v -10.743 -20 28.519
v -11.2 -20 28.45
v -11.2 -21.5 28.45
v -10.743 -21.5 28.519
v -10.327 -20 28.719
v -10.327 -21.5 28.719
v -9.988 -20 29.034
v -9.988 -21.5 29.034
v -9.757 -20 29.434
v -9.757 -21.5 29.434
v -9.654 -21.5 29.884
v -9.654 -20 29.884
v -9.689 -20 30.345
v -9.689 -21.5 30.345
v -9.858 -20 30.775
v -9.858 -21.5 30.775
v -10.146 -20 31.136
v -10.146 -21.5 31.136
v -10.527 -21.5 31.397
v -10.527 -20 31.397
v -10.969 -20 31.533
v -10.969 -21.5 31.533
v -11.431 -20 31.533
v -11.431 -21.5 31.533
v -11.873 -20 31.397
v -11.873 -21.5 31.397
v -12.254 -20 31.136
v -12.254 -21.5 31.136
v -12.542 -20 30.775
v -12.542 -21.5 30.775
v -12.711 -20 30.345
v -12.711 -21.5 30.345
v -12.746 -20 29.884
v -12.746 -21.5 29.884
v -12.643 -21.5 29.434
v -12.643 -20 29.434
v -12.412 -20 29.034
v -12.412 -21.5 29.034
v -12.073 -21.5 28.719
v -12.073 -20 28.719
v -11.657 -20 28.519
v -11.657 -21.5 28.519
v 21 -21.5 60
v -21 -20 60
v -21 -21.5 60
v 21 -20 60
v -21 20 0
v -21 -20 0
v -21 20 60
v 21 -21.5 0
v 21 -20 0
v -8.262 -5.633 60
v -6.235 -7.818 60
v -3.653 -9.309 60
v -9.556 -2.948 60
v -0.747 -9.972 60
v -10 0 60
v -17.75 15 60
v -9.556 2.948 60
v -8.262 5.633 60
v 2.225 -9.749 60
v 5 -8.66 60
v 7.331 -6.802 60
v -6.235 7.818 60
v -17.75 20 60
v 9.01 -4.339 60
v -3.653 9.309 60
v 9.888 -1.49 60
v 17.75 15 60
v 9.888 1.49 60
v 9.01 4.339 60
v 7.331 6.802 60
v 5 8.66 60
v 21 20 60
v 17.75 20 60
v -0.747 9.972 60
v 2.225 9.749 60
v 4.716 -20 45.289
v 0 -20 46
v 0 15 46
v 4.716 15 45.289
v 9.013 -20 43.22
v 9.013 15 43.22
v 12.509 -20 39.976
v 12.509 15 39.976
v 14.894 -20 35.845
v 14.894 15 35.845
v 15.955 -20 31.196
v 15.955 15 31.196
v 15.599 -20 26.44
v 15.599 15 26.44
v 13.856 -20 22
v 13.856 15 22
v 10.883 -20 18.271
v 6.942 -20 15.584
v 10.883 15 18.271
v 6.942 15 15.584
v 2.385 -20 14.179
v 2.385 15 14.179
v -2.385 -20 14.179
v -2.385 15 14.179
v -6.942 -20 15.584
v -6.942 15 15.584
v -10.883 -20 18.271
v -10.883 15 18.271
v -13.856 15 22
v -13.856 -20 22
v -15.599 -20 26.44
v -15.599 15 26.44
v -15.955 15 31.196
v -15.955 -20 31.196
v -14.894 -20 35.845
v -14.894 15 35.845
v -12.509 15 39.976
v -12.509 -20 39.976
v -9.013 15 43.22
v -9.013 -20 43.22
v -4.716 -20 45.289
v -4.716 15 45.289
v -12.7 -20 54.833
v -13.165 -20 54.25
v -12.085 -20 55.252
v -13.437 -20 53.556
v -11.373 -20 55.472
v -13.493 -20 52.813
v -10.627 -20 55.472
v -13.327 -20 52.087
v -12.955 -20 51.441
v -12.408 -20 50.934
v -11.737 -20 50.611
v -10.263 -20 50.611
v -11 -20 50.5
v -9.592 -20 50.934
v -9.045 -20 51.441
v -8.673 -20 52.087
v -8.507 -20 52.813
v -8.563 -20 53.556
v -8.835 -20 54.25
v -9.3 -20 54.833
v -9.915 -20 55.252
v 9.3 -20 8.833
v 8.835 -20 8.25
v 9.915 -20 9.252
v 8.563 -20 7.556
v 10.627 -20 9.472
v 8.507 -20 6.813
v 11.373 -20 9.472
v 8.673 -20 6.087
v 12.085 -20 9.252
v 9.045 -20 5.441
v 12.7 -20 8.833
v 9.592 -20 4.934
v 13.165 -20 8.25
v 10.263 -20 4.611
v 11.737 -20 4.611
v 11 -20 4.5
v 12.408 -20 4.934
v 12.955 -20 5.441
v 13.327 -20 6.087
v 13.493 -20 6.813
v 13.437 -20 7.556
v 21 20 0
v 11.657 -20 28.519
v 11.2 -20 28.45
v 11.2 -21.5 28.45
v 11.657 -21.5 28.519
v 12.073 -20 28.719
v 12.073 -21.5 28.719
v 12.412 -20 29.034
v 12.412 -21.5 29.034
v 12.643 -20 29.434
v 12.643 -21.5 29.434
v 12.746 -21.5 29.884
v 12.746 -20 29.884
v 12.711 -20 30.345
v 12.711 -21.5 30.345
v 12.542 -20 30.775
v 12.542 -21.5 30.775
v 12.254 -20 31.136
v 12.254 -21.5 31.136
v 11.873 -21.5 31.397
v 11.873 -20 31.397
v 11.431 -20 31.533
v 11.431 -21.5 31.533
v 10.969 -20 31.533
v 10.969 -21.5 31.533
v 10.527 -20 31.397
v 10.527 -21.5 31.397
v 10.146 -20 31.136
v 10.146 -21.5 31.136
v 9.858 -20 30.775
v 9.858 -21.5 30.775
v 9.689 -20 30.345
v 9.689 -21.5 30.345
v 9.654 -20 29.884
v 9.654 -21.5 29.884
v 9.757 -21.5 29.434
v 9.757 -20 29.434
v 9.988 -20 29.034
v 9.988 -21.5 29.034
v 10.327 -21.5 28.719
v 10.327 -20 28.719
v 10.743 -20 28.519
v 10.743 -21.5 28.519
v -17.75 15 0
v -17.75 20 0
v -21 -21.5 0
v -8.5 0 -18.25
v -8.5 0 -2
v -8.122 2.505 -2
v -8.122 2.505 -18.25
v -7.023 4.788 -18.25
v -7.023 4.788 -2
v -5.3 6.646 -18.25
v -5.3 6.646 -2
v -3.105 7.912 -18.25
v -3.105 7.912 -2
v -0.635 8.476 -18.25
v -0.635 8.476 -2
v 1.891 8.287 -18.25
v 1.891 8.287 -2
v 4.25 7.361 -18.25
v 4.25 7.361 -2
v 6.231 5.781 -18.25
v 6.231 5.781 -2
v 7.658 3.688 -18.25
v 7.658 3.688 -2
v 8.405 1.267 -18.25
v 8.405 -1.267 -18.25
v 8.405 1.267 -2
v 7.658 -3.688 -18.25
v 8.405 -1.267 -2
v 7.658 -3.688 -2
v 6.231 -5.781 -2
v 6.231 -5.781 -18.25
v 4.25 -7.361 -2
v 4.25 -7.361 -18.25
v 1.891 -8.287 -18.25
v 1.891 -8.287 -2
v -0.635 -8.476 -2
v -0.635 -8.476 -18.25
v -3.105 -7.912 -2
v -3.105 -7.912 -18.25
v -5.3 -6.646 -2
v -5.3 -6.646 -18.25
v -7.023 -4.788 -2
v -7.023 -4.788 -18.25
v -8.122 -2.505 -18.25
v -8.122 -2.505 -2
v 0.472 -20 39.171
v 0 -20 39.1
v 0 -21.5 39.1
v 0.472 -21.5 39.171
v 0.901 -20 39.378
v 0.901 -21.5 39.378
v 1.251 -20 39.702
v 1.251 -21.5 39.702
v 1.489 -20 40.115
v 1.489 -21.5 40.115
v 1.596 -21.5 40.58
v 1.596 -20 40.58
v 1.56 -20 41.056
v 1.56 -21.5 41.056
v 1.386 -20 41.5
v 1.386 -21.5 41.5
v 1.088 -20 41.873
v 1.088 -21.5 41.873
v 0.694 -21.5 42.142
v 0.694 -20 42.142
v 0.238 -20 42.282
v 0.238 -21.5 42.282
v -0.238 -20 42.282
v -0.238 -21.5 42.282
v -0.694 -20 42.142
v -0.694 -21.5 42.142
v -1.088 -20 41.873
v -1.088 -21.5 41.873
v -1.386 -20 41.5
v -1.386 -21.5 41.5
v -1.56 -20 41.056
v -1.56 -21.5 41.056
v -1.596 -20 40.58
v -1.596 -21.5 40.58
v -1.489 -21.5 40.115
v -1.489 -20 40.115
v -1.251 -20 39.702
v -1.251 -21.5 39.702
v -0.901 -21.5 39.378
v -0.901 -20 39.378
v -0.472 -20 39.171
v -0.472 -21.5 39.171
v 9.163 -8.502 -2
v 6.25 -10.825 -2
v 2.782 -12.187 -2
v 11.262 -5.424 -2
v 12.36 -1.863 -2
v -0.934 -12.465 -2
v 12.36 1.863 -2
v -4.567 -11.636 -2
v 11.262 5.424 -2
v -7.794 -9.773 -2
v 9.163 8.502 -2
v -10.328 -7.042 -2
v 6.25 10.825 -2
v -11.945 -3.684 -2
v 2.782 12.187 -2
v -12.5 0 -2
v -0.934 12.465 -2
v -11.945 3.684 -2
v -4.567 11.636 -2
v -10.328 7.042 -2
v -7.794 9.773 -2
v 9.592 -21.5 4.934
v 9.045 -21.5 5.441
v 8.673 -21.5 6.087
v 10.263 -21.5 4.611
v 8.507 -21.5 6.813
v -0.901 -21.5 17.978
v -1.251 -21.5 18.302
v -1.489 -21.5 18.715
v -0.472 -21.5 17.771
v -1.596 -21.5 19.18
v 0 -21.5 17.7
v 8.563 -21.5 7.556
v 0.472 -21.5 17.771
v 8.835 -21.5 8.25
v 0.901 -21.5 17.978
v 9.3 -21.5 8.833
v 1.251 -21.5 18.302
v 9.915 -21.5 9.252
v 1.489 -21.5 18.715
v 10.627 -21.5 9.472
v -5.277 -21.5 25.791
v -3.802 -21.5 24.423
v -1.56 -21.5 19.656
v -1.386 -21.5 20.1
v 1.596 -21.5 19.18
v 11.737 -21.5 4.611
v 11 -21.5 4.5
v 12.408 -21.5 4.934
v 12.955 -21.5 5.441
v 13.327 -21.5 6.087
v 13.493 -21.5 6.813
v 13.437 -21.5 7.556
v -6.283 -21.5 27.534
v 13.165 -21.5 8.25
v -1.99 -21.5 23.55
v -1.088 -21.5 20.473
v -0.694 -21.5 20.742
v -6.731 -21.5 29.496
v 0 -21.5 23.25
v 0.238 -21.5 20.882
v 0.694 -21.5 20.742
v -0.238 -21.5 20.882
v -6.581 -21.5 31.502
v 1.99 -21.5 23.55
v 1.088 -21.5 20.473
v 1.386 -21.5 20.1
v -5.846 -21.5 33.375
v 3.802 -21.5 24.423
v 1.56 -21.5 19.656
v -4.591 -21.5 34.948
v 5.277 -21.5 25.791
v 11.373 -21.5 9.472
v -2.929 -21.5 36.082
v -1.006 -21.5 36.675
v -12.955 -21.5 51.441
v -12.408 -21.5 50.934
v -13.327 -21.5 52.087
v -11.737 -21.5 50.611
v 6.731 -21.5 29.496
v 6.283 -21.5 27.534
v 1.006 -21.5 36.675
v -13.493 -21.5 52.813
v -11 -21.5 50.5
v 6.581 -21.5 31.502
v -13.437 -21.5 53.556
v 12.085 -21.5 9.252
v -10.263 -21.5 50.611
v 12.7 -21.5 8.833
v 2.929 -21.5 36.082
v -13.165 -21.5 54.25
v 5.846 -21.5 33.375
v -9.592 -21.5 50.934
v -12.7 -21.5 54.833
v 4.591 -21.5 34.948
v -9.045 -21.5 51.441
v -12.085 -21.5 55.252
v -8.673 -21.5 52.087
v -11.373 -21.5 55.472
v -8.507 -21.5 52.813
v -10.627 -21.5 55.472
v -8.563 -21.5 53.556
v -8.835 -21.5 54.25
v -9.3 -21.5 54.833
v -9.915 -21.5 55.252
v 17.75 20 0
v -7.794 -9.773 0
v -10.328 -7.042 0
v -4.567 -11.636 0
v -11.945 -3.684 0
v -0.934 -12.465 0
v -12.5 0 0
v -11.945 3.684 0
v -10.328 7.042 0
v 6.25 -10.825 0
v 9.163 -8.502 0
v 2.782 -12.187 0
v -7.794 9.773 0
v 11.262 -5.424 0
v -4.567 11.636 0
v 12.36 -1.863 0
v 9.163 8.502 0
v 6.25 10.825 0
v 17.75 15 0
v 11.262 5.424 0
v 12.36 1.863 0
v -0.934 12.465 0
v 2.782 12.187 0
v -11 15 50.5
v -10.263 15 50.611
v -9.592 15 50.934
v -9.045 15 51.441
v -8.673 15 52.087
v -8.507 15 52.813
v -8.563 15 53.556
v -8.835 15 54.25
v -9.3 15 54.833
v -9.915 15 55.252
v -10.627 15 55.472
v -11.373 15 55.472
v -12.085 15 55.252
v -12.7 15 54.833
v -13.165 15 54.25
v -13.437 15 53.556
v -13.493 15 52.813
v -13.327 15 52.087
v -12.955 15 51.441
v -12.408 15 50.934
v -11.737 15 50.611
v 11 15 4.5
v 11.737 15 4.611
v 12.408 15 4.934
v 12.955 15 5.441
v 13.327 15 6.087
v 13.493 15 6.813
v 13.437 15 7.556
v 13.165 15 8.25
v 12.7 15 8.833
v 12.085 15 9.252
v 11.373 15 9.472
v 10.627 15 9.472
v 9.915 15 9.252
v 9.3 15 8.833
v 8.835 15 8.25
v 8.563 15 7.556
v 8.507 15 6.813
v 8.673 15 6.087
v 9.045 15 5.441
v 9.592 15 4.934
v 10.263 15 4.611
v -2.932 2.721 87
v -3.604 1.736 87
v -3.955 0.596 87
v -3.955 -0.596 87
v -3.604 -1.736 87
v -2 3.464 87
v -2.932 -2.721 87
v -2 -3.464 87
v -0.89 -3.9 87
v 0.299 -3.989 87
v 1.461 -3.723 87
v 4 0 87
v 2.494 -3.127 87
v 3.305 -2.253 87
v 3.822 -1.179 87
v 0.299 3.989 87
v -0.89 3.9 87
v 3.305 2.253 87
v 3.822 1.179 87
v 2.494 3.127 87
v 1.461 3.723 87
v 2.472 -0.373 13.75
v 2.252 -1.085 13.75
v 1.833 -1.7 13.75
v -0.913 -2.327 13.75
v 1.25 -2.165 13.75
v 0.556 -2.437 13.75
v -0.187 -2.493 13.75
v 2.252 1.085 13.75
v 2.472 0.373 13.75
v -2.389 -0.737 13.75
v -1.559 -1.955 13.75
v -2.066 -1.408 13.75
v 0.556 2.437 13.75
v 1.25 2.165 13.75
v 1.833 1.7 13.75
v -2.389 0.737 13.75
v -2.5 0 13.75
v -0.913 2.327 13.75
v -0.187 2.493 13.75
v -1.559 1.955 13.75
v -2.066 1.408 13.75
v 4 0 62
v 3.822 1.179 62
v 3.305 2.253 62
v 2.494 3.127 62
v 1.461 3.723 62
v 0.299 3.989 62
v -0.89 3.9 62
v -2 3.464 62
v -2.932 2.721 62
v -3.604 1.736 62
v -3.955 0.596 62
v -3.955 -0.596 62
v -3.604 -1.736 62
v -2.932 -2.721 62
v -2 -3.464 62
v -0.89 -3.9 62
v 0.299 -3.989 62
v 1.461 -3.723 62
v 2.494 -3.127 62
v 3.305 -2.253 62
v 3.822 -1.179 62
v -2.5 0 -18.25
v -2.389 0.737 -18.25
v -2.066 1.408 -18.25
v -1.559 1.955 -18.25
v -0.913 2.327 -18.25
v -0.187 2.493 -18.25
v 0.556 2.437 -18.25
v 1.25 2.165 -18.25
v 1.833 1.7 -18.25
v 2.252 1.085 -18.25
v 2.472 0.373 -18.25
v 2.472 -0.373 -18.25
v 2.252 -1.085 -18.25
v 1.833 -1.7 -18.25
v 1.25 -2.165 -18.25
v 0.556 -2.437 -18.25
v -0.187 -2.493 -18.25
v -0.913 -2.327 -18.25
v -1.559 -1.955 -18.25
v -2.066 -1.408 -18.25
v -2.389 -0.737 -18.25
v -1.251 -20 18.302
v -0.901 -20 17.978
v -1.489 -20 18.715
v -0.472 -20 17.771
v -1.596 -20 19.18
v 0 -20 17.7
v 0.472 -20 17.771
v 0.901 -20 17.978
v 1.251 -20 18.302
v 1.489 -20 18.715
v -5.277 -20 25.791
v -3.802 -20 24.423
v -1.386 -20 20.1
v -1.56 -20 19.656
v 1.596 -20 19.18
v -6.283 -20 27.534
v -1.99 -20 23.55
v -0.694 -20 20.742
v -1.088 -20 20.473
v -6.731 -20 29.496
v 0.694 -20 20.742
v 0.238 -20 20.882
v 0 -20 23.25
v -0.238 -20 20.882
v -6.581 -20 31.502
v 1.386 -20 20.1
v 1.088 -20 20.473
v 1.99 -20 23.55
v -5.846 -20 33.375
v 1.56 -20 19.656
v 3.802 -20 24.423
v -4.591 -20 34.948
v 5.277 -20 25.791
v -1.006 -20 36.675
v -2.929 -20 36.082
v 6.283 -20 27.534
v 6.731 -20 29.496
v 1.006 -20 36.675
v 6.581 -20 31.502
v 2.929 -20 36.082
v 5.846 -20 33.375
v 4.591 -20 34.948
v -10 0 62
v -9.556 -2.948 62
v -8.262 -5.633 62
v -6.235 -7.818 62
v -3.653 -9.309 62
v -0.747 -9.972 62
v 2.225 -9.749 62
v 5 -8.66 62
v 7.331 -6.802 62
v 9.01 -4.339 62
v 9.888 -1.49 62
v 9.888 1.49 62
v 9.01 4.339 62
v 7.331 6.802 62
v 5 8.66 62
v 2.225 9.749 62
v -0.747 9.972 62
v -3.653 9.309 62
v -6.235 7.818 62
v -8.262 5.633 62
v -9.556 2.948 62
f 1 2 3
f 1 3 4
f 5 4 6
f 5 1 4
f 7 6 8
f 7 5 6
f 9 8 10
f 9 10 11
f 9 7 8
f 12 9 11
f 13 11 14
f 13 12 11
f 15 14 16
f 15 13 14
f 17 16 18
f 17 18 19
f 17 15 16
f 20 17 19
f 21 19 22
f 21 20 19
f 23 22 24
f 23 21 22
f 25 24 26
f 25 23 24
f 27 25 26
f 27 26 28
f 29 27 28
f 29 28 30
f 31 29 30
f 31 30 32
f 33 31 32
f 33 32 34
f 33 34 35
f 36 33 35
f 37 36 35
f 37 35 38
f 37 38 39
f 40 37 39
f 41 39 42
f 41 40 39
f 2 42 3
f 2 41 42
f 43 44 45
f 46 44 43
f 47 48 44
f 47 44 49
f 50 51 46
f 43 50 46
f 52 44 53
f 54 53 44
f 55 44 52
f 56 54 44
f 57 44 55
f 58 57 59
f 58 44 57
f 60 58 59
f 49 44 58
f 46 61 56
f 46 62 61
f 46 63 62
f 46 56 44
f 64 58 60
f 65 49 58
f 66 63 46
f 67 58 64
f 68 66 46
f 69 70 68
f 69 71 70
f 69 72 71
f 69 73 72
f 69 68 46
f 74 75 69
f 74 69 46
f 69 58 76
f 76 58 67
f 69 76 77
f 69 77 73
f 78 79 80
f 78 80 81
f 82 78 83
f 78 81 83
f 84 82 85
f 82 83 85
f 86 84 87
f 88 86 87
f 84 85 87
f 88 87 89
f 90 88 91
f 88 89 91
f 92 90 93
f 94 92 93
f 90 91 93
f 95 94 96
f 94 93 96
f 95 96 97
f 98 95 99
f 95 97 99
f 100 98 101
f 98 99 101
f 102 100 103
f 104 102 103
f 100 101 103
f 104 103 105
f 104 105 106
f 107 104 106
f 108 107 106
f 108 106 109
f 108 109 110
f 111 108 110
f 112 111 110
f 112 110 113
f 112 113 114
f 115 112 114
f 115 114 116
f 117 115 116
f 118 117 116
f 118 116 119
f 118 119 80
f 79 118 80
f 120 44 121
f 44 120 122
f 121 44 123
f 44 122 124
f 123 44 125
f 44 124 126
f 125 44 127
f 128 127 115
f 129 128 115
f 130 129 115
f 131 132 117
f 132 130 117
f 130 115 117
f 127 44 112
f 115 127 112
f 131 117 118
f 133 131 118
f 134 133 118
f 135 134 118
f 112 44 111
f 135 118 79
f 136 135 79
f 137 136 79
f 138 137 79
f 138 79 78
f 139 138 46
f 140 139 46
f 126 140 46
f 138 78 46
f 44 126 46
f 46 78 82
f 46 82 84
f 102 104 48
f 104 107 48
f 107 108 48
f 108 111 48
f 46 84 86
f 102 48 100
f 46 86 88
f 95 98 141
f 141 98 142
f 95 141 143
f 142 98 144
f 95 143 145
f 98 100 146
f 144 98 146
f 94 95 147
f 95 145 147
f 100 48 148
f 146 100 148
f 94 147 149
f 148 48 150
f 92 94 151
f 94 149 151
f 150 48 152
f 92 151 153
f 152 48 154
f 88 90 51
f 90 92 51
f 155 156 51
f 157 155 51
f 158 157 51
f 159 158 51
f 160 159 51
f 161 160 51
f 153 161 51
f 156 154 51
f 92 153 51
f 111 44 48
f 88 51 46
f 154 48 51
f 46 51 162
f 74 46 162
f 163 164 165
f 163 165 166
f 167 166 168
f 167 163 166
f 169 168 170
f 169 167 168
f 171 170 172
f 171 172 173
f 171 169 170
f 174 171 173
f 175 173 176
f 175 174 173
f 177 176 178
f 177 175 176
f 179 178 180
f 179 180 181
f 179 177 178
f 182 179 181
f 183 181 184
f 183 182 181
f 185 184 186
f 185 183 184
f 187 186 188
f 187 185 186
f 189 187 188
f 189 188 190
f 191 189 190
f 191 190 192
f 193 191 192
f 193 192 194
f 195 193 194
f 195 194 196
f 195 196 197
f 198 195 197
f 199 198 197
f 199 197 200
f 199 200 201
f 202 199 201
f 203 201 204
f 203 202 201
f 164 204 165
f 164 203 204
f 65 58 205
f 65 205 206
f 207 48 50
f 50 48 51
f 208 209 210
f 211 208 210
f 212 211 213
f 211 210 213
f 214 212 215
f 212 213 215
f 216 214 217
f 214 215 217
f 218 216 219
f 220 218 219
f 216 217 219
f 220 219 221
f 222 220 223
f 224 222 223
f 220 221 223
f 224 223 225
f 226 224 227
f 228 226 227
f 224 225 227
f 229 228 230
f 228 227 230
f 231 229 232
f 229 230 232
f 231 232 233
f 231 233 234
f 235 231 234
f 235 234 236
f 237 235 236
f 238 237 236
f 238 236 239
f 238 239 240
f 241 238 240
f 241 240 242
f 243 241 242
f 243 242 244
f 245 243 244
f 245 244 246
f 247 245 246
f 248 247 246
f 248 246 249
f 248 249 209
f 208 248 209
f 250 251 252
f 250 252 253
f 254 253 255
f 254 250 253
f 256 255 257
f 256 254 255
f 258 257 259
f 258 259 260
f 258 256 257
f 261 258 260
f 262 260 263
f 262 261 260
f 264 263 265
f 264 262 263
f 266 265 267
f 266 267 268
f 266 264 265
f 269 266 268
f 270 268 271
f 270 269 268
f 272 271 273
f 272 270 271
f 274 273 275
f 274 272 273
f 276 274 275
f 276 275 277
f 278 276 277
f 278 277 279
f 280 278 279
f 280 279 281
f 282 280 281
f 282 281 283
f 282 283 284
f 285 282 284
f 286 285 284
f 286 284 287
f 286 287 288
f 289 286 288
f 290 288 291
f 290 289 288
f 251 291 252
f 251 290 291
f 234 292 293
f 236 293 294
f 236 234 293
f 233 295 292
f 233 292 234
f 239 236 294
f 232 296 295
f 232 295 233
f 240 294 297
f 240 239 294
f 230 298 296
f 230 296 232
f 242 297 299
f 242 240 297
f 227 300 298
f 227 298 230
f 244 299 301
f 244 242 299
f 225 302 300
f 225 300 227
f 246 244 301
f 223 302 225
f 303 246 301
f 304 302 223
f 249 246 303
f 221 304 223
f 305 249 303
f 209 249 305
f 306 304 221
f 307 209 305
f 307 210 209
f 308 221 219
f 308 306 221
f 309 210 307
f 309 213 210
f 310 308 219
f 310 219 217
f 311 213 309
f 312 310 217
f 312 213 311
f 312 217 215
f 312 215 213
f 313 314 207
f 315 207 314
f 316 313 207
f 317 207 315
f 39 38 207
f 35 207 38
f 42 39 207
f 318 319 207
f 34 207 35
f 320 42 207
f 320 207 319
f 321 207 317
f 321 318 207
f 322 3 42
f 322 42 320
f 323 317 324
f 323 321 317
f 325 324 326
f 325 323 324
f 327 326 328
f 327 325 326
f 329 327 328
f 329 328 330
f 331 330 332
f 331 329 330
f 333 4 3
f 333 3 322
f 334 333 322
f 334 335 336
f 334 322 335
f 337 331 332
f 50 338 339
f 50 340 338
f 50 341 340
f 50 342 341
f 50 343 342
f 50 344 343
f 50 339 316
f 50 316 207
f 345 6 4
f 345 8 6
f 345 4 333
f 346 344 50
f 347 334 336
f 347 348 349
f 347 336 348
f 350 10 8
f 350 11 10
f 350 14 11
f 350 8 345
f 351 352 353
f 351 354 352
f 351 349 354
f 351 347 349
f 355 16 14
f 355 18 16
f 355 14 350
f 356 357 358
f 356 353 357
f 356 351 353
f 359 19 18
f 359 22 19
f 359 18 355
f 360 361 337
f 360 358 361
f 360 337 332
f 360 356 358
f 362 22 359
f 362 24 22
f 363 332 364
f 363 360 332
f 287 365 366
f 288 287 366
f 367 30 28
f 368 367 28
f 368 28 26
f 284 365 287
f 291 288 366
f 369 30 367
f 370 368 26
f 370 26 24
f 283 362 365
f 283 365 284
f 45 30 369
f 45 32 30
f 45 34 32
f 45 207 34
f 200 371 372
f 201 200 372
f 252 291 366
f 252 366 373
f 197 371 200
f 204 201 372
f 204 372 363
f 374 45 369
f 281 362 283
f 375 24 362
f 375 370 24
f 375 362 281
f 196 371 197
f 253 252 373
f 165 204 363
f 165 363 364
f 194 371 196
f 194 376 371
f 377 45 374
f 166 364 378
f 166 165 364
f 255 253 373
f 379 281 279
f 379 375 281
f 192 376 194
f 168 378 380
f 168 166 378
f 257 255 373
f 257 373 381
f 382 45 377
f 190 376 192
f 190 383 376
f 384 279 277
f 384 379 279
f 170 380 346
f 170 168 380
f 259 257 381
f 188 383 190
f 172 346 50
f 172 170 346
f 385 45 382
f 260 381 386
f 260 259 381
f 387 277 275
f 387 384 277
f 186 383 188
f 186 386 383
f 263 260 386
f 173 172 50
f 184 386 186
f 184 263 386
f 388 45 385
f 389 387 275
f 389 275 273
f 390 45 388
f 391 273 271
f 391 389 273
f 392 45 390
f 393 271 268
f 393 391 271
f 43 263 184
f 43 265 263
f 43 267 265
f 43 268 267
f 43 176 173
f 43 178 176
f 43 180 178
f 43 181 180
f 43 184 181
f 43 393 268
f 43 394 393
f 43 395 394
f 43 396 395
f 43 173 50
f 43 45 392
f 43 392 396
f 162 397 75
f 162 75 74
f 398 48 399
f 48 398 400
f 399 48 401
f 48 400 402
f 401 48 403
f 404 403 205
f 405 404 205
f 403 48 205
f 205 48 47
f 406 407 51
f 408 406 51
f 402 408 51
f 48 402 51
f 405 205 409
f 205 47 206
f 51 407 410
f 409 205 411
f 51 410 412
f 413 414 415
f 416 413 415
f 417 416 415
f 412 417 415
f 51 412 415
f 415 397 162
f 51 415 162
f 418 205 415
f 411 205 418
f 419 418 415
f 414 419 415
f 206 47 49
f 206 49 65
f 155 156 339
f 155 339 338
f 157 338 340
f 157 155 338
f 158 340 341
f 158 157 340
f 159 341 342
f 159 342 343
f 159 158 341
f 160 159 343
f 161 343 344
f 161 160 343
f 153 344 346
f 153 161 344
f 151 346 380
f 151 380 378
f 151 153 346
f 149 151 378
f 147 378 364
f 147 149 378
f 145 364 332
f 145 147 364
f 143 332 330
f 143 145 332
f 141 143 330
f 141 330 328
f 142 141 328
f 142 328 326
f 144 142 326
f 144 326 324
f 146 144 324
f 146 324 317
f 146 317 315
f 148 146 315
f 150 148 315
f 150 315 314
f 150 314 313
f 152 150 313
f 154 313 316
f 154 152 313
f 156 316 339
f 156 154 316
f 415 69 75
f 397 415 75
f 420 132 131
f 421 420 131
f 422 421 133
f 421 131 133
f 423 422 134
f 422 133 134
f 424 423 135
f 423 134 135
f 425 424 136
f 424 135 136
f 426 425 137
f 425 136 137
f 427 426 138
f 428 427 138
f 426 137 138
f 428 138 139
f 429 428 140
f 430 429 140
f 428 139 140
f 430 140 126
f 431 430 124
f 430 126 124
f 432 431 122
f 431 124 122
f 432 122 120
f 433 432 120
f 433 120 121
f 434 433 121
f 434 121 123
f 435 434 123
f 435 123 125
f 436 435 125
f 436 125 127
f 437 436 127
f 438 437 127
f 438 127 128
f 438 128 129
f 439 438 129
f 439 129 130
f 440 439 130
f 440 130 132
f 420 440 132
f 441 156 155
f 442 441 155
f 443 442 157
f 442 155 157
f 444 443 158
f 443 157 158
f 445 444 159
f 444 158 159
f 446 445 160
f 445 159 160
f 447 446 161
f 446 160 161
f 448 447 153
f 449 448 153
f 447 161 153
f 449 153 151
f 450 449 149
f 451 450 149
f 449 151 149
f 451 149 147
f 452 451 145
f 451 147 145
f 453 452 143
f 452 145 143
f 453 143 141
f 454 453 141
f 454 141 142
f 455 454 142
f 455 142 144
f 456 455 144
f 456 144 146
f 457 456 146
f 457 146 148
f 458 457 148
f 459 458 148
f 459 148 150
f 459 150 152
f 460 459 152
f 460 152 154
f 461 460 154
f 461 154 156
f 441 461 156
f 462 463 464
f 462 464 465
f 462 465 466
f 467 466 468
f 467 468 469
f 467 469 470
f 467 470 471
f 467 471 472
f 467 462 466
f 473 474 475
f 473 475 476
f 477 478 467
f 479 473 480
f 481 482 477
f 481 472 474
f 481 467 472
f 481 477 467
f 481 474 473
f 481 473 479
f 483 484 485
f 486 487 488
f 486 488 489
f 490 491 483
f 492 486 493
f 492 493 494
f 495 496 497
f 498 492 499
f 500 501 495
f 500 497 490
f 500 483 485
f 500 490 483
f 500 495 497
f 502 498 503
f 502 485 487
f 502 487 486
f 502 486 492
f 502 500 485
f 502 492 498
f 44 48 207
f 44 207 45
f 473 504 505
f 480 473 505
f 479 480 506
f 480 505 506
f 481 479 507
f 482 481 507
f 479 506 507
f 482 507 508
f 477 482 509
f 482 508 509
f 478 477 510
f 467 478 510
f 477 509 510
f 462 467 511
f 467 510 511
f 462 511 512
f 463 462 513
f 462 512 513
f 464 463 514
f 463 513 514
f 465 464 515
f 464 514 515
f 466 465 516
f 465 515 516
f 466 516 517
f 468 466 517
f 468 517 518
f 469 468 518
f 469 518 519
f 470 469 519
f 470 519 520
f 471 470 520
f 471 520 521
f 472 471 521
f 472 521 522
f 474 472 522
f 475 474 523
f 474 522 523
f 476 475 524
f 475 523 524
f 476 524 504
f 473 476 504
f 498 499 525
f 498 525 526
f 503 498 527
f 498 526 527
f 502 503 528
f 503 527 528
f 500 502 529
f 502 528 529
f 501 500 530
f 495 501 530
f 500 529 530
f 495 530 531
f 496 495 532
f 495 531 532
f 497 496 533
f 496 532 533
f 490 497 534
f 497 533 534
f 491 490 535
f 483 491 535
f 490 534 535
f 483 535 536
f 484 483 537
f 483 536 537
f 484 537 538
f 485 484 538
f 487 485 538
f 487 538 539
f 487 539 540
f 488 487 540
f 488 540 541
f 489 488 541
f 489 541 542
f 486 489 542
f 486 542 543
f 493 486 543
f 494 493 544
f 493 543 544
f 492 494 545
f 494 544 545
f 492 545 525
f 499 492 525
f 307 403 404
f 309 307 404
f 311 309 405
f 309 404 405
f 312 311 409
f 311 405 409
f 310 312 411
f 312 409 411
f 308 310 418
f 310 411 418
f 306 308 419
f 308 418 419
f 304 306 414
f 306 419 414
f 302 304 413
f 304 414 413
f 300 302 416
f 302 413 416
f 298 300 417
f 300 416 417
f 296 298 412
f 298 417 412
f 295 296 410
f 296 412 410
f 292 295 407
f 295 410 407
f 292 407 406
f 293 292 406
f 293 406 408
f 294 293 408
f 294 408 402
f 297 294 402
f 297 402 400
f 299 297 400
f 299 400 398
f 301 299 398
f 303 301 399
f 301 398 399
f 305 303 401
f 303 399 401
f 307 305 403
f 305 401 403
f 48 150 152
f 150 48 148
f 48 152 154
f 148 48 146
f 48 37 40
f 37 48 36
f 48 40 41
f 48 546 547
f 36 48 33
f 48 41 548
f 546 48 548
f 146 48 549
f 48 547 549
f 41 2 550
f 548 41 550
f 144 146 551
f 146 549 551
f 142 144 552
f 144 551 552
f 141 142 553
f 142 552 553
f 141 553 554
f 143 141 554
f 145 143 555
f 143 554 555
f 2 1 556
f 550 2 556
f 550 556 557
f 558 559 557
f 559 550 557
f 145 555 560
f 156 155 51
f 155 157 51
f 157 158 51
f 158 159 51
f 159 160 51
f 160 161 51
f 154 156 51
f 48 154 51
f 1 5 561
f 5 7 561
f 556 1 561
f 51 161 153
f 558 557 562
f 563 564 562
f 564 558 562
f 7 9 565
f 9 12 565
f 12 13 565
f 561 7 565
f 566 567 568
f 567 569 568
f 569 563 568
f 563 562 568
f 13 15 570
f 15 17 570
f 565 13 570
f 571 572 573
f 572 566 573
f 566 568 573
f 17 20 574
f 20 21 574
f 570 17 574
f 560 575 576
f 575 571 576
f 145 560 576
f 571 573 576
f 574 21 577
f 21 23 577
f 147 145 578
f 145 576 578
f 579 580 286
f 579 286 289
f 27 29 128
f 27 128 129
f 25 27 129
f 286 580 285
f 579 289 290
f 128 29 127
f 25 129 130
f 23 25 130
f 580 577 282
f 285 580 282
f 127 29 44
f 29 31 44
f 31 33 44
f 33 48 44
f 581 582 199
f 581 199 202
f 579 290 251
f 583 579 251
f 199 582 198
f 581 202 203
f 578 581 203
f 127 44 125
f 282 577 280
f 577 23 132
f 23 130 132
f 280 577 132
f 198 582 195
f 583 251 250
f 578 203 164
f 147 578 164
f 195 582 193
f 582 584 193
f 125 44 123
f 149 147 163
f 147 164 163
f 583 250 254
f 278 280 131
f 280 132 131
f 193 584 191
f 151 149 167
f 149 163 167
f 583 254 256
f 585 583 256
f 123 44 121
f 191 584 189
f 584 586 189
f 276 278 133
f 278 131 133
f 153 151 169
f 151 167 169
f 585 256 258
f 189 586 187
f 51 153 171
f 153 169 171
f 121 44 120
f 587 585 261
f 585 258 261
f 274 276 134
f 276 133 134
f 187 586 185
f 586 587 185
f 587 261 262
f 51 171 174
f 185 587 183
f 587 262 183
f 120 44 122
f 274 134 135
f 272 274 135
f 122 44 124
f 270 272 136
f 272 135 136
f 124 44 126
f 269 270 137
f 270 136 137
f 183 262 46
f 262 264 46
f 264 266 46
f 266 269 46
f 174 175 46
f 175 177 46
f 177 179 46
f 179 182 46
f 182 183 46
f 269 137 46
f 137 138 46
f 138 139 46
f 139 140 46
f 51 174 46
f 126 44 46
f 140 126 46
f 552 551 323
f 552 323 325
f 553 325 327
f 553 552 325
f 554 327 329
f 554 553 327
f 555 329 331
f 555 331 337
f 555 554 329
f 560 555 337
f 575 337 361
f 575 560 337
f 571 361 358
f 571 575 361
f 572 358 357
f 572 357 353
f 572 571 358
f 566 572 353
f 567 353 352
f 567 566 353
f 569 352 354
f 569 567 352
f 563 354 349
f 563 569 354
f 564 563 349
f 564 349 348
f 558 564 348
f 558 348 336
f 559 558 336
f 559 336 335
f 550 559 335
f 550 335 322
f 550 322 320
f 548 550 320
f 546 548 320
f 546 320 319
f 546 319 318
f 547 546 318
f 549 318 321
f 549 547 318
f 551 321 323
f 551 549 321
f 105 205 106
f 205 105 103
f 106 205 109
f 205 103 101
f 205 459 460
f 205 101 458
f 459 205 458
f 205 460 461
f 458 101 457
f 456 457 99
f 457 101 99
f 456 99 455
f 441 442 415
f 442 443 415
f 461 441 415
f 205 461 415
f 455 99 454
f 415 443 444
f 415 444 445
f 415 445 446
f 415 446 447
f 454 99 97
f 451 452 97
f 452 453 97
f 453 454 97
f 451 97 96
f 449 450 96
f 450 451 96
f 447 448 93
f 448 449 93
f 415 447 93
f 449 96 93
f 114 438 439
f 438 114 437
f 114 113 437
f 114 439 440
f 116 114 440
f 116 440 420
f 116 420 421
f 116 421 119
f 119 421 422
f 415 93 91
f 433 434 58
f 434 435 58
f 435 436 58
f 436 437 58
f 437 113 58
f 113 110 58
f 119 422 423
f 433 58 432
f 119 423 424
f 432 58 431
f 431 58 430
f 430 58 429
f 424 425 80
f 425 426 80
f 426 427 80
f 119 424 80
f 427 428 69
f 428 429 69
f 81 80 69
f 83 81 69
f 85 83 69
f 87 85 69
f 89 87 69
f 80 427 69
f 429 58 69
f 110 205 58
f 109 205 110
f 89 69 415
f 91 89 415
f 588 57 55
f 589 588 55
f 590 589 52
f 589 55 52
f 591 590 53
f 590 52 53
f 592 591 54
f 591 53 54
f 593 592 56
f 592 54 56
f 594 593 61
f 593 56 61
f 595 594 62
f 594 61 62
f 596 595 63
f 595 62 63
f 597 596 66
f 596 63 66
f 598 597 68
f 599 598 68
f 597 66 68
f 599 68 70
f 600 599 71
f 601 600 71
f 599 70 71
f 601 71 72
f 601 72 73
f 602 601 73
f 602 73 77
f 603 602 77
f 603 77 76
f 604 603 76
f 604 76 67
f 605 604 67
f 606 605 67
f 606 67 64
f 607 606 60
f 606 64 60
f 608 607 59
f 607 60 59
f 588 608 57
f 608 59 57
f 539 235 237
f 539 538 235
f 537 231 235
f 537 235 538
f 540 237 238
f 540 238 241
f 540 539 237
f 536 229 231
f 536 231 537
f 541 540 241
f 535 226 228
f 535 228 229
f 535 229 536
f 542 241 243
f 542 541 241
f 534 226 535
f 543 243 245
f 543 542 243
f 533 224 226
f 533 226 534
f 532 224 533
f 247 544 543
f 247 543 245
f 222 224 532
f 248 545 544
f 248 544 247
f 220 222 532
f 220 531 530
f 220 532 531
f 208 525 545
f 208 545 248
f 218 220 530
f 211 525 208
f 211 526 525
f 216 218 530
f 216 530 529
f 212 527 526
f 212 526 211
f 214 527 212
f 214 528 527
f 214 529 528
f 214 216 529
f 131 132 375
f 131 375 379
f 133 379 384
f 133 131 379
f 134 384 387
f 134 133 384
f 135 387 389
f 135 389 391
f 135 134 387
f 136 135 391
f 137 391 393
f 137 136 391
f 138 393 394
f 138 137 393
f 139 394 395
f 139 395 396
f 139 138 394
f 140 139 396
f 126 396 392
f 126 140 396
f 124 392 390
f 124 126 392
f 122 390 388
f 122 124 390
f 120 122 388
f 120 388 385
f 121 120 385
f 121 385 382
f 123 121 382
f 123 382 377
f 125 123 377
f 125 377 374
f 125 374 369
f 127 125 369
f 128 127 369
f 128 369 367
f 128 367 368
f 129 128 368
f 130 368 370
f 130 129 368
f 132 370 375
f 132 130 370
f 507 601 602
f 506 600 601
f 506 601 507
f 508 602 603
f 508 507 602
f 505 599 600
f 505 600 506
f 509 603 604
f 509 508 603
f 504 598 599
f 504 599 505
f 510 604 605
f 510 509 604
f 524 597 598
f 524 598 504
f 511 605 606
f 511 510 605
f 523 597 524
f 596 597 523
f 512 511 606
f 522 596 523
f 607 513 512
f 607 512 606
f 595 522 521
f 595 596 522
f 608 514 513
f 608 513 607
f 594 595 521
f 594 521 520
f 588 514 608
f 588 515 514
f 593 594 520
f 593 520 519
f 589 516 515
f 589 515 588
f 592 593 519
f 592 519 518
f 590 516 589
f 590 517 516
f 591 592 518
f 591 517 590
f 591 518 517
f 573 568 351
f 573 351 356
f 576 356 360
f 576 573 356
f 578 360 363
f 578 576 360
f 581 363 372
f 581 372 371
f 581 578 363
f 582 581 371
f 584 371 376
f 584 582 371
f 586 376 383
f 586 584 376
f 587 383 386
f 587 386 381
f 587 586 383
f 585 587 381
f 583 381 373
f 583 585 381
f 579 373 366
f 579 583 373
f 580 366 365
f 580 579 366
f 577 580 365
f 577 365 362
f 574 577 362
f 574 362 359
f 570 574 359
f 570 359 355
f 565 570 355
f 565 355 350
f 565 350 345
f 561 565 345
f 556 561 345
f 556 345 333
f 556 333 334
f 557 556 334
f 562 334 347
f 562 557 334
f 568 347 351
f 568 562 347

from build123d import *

# Parameters (mm, degrees)
SKETCH1_W           = 42
SKETCH1_H           = 40
BOSS_EXTRUDE1_DEPTH = 60
SKETCH2_W           = 35.5
SKETCH2_H           = 5
CUT_EXTRUDE1_DEPTH  = 60
SKETCH3_R           = 16
CUT_EXTRUDE2_DEPTH  = 40
SKETCH4_R           = 8.5
BOSS_EXTRUDE2_DEPTH = 18.25
SKETCH6_R           = 12.5
BOSS_EXTRUDE3_DEPTH = 2
SKETCH7_R           = 10
BOSS_EXTRUDE4_DEPTH = 2
SKETCH8_R           = 4
BOSS_EXTRUDE5_DEPTH = 25
SKETCH9_R           = 2.5
CUT_EXTRUDE6_DEPTH  = 32
SKETCH10_W          = 42
SKETCH10_H          = 60
SKETCH10_R          = 2.5
SKETCH10_R_2        = 6.75
SKETCH10_R_3        = 1.6
SKETCH10_R_4        = 1.55
BASE_FLANGE1_DEPTH  = 1.5
SKETCH15_R          = 2.5
CUT_EXTRUDE7_DEPTH  = 99.030607465


# Sheet-metal steps are written as plain solids
with BuildPart() as part:
    # Sketch1 → Boss-Extrude1 (new body)
    with BuildSketch(Plane.XY):
        Rectangle(SKETCH1_W, SKETCH1_H)
    extrude(amount=BOSS_EXTRUDE1_DEPTH)

    # Sketch2 → Cut-Extrude1 (cut)
    with BuildSketch(Plane.XY.offset(60)):
        with Locations((0, 17.5)):
            Rectangle(SKETCH2_W, SKETCH2_H)
    extrude(amount=-CUT_EXTRUDE1_DEPTH, mode=Mode.SUBTRACT)

    # Sketch3 → Cut-Extrude2 (cut)
    with BuildSketch(Plane(origin=(0, 15, 0), x_dir=(1, 0, 0), z_dir=(0, 1, 0))):
        with Locations(Location((0, -30, 0), (0, 0, 270))):
            Circle(SKETCH3_R)
    extrude(amount=-CUT_EXTRUDE2_DEPTH, mode=Mode.SUBTRACT)

    # Sketch4 → Boss-Extrude2 (add)
    with BuildSketch(Plane(origin=(0, 0, 0), x_dir=(-1, 0, 0), z_dir=(0, 0, -1))):
        Circle(SKETCH4_R)
    extrude(amount=BOSS_EXTRUDE2_DEPTH)

    # Sketch6 → Boss-Extrude3 (add)
    with BuildSketch(Plane(origin=(0, 0, 0), x_dir=(-1, 0, 0), z_dir=(0, 0, -1))):
        Circle(SKETCH6_R)
    extrude(amount=BOSS_EXTRUDE3_DEPTH)

    # Sketch7 → Boss-Extrude4 (add)
    with BuildSketch(Plane.XY.offset(60)):
        with Locations(Location((0, 0, 0), (0, 0, 180))):
            Circle(SKETCH7_R)
    extrude(amount=BOSS_EXTRUDE4_DEPTH)

    # Sketch8 → Boss-Extrude5 (add)
    with BuildSketch(Plane.XY.offset(62)):
        Circle(SKETCH8_R)
    extrude(amount=BOSS_EXTRUDE5_DEPTH)

    # Sketch9 → Cut-Extrude6 (cut)
    with BuildSketch(Plane(origin=(0, 0, -18.25), x_dir=(-1, 0, 0), z_dir=(0, 0, -1))):
        Circle(SKETCH9_R)
    extrude(amount=-CUT_EXTRUDE6_DEPTH, mode=Mode.SUBTRACT)

    # Sketch15 → Cut-Extrude7 (cut, through all)
    with BuildSketch(Plane.XZ.offset(20)):
        with Locations(Location((-11, 53, 0), (0, 0, 270))):
            Circle(SKETCH15_R)
        with Locations(Location((11, 7, 0), (0, 0, 270))):
            Circle(SKETCH15_R)
    extrude(amount=-CUT_EXTRUDE7_DEPTH, mode=Mode.SUBTRACT)


with BuildPart() as body_2:
    # Sketch10 → Base-Flange1 (new body)
    with BuildSketch(Plane.XZ.offset(20)):
        with Locations((0, 30)):
            Rectangle(SKETCH10_W, SKETCH10_H)
        with Locations(Location((-11, 53, 0), (0, 0, 270))):
            Circle(SKETCH10_R, mode=Mode.SUBTRACT)
        with Locations(Location((11, 7, 0), (0, 0, 270))):
            Circle(SKETCH10_R, mode=Mode.SUBTRACT)
        with Locations(Location((0, 30, 0), (0, 0, 270))):
            Circle(SKETCH10_R_2, mode=Mode.SUBTRACT)
        with Locations(Location((0, 40.7, 0), (0, 0, 270))):
            Circle(SKETCH10_R_3, mode=Mode.SUBTRACT)
        with Locations(Location((0, 19.3, 0), (0, 0, 270))):
            Circle(SKETCH10_R_3, mode=Mode.SUBTRACT)
        with Locations(Location((-11.2, 30, 0), (0, 0, 270))):
            Circle(SKETCH10_R_4, mode=Mode.SUBTRACT)
        with Locations(Location((11.2, 30, 0), (0, 0, 270))):
            Circle(SKETCH10_R_4, mode=Mode.SUBTRACT)
    extrude(amount=BASE_FLANGE1_DEPTH)


solid = Compound([part.part, body_2.part])
